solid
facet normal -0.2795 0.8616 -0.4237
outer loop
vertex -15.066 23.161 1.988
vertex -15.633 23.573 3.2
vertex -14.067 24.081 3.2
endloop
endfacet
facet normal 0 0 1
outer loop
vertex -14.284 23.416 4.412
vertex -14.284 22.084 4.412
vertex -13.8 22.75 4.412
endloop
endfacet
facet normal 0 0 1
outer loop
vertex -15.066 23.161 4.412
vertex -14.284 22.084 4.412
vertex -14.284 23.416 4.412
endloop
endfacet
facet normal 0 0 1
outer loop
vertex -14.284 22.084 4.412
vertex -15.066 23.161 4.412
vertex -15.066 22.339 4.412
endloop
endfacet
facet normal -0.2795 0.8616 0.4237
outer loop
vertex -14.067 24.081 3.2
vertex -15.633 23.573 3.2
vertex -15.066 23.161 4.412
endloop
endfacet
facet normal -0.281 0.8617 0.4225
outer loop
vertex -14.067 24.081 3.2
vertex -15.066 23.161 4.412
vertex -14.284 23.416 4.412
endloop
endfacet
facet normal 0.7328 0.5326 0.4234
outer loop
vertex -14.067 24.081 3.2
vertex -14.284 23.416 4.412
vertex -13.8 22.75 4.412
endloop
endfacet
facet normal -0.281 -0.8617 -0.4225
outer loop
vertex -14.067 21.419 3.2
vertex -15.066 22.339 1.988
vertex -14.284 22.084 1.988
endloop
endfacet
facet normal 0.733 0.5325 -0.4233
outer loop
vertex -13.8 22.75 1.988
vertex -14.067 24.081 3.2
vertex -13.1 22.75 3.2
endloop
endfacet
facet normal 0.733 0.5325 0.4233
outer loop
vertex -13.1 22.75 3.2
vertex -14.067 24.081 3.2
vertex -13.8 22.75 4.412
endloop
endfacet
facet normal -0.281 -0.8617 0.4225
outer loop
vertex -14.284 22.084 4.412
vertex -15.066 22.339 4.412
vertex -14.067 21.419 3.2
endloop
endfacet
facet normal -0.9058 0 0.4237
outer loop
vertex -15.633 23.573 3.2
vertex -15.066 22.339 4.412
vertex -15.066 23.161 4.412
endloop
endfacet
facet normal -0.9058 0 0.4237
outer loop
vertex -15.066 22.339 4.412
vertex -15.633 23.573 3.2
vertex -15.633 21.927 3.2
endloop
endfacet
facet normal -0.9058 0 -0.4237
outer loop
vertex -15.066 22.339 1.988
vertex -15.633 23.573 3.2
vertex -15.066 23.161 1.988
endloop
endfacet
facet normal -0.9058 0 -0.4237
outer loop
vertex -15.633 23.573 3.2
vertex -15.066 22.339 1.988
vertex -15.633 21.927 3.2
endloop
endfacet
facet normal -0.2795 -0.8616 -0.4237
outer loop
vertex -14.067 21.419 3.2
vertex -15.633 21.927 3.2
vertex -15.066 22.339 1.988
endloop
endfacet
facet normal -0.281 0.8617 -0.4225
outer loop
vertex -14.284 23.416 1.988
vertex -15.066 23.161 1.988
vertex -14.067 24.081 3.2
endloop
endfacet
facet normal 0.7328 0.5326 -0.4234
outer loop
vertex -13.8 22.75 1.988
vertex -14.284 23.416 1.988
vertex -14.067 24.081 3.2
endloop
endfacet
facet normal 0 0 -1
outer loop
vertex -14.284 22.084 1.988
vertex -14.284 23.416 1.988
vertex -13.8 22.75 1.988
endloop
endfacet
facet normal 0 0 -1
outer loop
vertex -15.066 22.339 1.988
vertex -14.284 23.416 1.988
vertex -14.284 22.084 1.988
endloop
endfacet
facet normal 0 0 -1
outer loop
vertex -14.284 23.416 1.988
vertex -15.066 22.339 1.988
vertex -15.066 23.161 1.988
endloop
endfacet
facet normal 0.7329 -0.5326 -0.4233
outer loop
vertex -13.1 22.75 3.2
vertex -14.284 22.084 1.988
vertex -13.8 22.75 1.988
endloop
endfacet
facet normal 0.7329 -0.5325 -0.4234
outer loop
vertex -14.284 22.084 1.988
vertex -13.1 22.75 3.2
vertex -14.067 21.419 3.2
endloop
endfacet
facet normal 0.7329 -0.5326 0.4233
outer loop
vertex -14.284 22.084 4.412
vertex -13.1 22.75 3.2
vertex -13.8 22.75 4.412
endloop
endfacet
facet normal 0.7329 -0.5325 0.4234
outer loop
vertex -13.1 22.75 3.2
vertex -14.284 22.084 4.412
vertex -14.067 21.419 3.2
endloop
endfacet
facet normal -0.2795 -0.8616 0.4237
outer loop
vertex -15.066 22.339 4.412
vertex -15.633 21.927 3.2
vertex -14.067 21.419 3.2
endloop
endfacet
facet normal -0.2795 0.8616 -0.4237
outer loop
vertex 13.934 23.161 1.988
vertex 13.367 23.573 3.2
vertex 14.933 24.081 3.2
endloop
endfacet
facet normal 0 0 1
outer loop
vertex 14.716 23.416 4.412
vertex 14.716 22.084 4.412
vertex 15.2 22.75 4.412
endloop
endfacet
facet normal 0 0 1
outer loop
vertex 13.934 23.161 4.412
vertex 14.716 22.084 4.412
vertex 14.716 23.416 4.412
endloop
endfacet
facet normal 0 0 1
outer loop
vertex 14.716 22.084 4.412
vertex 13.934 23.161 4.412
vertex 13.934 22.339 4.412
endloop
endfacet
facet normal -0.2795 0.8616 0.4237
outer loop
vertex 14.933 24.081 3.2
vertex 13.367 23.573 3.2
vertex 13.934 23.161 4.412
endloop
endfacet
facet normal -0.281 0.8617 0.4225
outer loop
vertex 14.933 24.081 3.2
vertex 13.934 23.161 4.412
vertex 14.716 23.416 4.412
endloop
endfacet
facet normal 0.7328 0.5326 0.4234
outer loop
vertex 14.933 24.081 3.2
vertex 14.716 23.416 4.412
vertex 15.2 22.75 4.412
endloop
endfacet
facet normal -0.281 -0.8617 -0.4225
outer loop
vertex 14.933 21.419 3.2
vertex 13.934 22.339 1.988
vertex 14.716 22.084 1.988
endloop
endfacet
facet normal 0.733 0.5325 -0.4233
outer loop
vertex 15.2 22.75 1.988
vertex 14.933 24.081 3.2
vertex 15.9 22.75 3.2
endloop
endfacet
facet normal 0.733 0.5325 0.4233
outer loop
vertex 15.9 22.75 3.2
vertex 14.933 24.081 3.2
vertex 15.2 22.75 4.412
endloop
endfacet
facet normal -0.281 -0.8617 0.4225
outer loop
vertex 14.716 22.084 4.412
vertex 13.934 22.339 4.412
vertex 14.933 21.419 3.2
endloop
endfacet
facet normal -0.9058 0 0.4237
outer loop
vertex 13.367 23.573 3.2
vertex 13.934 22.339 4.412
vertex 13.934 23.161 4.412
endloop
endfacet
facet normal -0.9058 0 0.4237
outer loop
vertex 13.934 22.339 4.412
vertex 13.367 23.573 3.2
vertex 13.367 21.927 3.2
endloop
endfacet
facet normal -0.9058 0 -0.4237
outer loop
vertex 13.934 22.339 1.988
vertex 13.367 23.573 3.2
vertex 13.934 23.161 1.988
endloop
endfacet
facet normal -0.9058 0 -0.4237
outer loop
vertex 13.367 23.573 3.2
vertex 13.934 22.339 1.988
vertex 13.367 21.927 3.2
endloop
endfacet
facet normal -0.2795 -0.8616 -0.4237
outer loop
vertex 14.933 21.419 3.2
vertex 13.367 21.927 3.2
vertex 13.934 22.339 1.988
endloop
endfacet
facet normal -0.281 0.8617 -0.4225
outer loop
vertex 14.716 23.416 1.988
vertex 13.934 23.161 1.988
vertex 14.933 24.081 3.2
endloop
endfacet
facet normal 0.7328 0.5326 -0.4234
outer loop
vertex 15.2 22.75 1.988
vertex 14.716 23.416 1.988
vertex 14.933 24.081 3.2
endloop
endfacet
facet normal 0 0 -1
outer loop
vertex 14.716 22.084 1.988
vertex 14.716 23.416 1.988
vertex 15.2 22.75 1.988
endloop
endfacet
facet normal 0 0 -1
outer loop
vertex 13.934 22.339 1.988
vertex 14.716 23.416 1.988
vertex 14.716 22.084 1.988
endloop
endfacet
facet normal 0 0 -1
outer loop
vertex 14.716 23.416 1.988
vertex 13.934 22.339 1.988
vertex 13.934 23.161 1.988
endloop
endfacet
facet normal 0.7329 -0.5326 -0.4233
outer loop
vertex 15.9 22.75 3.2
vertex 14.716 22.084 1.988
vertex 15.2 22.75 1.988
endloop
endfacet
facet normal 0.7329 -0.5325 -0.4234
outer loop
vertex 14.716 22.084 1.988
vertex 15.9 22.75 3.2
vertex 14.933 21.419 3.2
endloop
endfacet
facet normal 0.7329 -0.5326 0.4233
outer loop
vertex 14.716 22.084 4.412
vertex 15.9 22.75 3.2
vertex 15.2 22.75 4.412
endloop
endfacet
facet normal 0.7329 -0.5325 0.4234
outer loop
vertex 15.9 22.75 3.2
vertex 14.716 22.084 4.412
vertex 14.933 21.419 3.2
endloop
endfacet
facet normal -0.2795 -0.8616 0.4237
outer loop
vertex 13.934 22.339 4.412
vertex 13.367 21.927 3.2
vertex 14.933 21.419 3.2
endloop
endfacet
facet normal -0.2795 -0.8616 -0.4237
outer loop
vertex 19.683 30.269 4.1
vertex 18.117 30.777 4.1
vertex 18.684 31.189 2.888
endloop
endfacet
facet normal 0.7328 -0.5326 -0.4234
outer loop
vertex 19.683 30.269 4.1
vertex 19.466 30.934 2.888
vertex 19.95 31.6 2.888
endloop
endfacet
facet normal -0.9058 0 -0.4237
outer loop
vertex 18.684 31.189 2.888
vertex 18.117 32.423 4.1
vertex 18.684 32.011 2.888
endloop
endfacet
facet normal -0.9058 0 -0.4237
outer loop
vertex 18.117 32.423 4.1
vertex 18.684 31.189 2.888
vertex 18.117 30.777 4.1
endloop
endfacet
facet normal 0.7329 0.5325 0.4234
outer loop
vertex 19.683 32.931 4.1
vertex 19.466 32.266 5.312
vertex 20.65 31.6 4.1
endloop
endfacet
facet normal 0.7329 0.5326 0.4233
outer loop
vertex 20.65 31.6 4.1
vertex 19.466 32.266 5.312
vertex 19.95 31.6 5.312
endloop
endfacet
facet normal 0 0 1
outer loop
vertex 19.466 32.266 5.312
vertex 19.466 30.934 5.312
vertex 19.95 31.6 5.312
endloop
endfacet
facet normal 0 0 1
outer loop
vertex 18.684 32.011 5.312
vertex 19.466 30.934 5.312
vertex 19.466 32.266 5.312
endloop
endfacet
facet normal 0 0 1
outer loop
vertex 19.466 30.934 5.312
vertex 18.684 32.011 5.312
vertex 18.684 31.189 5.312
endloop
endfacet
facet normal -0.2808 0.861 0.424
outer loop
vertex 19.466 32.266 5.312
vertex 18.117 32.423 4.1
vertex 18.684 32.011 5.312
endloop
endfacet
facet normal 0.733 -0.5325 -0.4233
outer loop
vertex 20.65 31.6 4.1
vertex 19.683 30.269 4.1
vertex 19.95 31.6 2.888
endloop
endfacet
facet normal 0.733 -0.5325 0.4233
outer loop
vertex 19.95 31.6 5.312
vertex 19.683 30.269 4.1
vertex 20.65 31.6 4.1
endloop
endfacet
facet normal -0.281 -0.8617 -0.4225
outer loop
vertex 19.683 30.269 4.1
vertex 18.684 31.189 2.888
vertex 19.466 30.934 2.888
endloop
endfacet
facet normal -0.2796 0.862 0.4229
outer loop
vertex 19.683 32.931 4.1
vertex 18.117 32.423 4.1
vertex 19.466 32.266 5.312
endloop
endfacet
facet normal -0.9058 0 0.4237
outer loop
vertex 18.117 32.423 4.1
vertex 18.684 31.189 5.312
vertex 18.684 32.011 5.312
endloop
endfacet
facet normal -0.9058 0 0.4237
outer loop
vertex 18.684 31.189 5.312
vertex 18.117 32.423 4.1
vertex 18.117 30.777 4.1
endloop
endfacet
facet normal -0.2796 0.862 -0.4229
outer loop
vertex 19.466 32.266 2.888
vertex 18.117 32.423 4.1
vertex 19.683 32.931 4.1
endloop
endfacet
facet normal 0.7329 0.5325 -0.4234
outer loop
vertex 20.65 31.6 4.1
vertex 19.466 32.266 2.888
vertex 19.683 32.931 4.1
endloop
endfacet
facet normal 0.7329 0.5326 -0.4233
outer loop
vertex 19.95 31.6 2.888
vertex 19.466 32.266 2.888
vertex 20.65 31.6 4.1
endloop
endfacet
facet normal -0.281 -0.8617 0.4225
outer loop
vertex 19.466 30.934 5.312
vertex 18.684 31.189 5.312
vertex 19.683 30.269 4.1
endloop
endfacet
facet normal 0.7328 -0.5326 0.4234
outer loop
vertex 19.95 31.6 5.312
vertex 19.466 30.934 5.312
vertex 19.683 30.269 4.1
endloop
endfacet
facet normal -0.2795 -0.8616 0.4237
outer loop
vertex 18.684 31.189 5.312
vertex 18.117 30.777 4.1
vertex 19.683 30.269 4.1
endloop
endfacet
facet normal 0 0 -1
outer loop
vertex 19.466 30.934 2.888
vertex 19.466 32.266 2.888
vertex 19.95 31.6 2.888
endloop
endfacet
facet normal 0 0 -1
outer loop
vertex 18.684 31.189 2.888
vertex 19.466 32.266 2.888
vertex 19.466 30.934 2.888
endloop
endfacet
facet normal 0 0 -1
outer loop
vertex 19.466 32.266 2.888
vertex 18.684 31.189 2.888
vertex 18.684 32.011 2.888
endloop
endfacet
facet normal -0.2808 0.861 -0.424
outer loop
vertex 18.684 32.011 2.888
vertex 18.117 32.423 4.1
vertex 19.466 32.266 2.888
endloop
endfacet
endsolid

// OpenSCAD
union() {
  translate([-14.5, 22.75, 3.2]) sphere(r=1.4);
  translate([14.5, 22.75, 3.2]) sphere(r=1.4);
  translate([19.25, 31.6, 4.1]) sphere(r=1.4);
}
